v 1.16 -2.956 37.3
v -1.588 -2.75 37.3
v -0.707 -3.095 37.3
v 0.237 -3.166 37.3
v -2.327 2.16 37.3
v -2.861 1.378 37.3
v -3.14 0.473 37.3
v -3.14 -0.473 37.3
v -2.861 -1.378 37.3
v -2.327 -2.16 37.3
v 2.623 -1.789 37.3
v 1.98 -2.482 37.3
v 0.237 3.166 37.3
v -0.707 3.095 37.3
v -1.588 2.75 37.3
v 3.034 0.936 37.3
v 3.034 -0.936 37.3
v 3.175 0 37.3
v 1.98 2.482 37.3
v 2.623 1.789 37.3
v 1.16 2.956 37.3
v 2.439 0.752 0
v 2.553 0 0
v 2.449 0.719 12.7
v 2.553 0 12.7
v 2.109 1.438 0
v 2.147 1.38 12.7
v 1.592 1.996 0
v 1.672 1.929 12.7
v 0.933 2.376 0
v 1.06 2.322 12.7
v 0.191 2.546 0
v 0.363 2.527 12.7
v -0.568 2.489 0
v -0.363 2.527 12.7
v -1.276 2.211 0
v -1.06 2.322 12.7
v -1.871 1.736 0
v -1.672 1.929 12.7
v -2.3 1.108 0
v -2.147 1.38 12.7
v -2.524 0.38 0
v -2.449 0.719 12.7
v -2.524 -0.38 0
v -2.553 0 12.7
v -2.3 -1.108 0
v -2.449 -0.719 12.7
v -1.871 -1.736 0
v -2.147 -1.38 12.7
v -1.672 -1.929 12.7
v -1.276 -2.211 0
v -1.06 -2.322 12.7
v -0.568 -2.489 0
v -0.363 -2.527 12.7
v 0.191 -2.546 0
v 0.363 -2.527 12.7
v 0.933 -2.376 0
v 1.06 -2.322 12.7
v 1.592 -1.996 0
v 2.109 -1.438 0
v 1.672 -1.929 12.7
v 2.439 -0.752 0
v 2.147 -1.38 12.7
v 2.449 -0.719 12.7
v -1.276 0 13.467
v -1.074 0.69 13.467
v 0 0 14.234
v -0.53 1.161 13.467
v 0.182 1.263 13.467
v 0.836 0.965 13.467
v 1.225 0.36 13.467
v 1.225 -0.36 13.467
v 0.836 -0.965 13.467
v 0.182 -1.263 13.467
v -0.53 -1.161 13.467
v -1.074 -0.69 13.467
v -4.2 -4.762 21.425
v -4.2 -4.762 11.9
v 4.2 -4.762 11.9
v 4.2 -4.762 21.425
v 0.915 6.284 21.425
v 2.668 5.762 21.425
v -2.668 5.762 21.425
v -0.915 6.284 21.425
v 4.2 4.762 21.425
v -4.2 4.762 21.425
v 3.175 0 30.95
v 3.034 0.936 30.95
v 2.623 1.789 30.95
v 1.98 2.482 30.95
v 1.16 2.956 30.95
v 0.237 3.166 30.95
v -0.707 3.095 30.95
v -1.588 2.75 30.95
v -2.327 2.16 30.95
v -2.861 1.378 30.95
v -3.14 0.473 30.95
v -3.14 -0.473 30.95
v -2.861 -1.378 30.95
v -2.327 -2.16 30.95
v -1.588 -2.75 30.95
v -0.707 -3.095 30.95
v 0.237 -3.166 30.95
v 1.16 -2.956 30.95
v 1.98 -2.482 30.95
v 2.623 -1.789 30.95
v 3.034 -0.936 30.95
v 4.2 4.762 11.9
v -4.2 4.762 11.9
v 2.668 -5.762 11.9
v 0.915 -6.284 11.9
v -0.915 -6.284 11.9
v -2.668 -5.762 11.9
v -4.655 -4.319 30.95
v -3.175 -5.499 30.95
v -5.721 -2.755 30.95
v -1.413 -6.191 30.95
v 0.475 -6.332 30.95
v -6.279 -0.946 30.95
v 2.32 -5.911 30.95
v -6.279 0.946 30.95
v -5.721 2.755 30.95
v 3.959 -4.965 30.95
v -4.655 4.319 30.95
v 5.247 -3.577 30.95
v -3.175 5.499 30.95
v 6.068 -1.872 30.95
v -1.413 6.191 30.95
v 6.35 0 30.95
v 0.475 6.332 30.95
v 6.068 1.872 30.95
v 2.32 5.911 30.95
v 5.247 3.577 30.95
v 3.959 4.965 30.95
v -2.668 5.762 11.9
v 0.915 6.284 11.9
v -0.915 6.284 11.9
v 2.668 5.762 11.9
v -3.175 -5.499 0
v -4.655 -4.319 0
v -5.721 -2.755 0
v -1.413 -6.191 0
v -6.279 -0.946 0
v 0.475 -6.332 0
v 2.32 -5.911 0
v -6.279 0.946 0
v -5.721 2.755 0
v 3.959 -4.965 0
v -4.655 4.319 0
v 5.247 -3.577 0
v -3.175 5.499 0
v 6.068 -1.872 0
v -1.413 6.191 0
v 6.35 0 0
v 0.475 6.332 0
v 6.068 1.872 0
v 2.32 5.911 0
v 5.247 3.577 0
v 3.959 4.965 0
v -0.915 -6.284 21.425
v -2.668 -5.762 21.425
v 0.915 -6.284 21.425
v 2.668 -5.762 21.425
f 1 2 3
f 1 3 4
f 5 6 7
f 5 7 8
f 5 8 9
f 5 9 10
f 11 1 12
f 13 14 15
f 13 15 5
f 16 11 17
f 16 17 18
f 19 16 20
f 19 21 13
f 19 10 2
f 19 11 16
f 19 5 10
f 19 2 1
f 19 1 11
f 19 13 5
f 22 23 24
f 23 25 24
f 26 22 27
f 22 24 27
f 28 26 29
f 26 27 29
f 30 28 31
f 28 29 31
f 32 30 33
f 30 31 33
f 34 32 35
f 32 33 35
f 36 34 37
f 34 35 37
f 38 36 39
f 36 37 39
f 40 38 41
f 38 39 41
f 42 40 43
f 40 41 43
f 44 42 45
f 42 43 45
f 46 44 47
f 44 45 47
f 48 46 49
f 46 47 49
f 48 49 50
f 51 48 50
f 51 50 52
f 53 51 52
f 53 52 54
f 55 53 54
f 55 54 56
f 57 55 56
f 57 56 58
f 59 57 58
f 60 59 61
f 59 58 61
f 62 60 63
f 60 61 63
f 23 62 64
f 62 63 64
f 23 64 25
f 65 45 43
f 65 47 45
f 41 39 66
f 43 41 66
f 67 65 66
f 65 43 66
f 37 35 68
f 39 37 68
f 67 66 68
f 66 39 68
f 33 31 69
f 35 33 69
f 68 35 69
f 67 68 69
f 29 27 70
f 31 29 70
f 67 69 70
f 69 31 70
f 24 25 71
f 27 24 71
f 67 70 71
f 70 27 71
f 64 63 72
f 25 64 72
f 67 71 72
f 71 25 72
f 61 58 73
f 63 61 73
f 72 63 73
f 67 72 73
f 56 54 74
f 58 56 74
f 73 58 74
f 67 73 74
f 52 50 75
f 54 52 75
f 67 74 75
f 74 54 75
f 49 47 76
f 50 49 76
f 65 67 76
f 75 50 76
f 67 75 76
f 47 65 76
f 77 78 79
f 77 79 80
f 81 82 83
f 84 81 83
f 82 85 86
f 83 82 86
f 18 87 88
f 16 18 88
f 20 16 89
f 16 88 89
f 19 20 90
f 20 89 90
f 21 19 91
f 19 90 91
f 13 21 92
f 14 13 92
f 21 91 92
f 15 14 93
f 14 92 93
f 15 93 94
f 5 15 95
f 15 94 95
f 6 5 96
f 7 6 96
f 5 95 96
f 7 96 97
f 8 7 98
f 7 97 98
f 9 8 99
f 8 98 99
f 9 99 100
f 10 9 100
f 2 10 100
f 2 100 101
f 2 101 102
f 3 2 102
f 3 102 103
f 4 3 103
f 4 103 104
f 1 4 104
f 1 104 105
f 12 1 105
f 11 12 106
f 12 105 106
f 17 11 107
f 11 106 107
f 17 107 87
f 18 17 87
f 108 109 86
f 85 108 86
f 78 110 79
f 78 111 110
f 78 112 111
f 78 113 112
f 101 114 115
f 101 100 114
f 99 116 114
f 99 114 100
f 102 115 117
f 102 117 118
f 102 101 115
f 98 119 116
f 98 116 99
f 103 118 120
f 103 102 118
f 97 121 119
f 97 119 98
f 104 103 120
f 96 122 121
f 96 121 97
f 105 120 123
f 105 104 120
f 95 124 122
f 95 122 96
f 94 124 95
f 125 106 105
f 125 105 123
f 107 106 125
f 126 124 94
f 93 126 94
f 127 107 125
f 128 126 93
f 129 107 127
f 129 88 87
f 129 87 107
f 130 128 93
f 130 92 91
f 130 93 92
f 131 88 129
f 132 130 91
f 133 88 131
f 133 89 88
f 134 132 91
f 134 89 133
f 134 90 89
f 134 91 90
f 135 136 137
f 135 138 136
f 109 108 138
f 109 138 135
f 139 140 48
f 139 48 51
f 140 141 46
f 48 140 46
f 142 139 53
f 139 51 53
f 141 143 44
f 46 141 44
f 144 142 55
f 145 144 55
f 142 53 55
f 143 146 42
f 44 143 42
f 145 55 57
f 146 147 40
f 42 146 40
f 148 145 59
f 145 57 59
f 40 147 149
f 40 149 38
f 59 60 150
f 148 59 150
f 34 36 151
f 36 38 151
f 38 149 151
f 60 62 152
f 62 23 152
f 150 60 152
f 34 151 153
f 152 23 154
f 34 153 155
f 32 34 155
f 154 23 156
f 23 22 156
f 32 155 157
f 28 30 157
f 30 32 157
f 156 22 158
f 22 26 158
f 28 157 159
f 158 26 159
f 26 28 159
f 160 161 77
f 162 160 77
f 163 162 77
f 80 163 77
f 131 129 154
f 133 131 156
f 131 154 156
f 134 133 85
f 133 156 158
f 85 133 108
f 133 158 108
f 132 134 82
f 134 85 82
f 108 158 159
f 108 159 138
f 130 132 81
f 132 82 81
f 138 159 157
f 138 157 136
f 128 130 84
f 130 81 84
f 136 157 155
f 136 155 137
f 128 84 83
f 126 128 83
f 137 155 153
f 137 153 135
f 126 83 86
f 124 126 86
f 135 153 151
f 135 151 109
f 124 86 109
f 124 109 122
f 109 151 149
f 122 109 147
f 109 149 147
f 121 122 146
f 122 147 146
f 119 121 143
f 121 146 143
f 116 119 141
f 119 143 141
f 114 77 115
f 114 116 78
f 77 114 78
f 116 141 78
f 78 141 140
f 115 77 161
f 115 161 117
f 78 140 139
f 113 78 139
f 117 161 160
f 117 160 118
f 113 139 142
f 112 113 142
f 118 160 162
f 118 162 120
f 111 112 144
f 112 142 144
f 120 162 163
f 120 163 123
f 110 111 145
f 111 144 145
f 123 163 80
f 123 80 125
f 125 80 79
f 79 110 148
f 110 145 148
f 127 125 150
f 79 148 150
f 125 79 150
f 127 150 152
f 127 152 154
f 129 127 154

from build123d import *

# Parameters (mm, degrees)
SKETCH2_R                       = 6.35
BOSS_EXTRUDE1_DEPTH             = 30.9499
TAP_DRILL_FOR_1_4_20_TAP1_D     = 5.1054
TAP_DRILL_FOR_1_4_20_TAP1_DEPTH = 12.7
TAP_DRILL_FOR_1_4_20_TAP1_TIP   = 1.533816902
SKETCH6_R                       = 3.175
BOSS_EXTRUDE2_DEPTH             = 6.35
CUT_EXTRUDE1_DEPTH              = 39.365707865
CUT_EXTRUDE1_DEPTH_BACK         = 39.365707865
SKETCH7_W                       = 1.5875
SKETCH7_H                       = 9.525


with BuildPart() as part:
    # Sketch2 → Boss-Extrude1 (new body)
    with BuildSketch(Plane(origin=(0, 0, 0), x_dir=(0, 1, 0), z_dir=(0, 0, 1))):
        with Locations(Location((0, 0, 0), (0, 0, 270))):
            Circle(SKETCH2_R)
    extrude(amount=BOSS_EXTRUDE1_DEPTH)

    # Tap Drill for 1/4-20 Tap1
    with Locations(Plane(origin=(0, 0, 0), x_dir=(-1, 0, 0), z_dir=(0, 0, -1))):
        with Locations((0, 0)):
            Hole(TAP_DRILL_FOR_1_4_20_TAP1_D / 2, depth=TAP_DRILL_FOR_1_4_20_TAP1_DEPTH)
            with Locations((0, 0, -(TAP_DRILL_FOR_1_4_20_TAP1_DEPTH + TAP_DRILL_FOR_1_4_20_TAP1_TIP / 2))):  # 118° drill point
                Cone(0, TAP_DRILL_FOR_1_4_20_TAP1_D / 2, TAP_DRILL_FOR_1_4_20_TAP1_TIP, mode=Mode.SUBTRACT)

    # Sketch6 → Boss-Extrude2 (add)
    with BuildSketch(Plane.XY.offset(30.9499)):
        Circle(SKETCH6_R)
    extrude(amount=BOSS_EXTRUDE2_DEPTH)

    # Sketch7 → Cut-Extrude1 (cut, two sides: drawn at the far end of the back side and taken through both)
    with BuildSketch(Plane.YZ.offset(-CUT_EXTRUDE1_DEPTH_BACK)):
        with Locations((-5.55625, 16.6624)):
            Rectangle(SKETCH7_W, SKETCH7_H)
        with Locations((5.55625, 16.6624)):
            Rectangle(SKETCH7_W, SKETCH7_H)
    extrude(amount=CUT_EXTRUDE1_DEPTH + CUT_EXTRUDE1_DEPTH_BACK, mode=Mode.SUBTRACT)


solid = part.part
